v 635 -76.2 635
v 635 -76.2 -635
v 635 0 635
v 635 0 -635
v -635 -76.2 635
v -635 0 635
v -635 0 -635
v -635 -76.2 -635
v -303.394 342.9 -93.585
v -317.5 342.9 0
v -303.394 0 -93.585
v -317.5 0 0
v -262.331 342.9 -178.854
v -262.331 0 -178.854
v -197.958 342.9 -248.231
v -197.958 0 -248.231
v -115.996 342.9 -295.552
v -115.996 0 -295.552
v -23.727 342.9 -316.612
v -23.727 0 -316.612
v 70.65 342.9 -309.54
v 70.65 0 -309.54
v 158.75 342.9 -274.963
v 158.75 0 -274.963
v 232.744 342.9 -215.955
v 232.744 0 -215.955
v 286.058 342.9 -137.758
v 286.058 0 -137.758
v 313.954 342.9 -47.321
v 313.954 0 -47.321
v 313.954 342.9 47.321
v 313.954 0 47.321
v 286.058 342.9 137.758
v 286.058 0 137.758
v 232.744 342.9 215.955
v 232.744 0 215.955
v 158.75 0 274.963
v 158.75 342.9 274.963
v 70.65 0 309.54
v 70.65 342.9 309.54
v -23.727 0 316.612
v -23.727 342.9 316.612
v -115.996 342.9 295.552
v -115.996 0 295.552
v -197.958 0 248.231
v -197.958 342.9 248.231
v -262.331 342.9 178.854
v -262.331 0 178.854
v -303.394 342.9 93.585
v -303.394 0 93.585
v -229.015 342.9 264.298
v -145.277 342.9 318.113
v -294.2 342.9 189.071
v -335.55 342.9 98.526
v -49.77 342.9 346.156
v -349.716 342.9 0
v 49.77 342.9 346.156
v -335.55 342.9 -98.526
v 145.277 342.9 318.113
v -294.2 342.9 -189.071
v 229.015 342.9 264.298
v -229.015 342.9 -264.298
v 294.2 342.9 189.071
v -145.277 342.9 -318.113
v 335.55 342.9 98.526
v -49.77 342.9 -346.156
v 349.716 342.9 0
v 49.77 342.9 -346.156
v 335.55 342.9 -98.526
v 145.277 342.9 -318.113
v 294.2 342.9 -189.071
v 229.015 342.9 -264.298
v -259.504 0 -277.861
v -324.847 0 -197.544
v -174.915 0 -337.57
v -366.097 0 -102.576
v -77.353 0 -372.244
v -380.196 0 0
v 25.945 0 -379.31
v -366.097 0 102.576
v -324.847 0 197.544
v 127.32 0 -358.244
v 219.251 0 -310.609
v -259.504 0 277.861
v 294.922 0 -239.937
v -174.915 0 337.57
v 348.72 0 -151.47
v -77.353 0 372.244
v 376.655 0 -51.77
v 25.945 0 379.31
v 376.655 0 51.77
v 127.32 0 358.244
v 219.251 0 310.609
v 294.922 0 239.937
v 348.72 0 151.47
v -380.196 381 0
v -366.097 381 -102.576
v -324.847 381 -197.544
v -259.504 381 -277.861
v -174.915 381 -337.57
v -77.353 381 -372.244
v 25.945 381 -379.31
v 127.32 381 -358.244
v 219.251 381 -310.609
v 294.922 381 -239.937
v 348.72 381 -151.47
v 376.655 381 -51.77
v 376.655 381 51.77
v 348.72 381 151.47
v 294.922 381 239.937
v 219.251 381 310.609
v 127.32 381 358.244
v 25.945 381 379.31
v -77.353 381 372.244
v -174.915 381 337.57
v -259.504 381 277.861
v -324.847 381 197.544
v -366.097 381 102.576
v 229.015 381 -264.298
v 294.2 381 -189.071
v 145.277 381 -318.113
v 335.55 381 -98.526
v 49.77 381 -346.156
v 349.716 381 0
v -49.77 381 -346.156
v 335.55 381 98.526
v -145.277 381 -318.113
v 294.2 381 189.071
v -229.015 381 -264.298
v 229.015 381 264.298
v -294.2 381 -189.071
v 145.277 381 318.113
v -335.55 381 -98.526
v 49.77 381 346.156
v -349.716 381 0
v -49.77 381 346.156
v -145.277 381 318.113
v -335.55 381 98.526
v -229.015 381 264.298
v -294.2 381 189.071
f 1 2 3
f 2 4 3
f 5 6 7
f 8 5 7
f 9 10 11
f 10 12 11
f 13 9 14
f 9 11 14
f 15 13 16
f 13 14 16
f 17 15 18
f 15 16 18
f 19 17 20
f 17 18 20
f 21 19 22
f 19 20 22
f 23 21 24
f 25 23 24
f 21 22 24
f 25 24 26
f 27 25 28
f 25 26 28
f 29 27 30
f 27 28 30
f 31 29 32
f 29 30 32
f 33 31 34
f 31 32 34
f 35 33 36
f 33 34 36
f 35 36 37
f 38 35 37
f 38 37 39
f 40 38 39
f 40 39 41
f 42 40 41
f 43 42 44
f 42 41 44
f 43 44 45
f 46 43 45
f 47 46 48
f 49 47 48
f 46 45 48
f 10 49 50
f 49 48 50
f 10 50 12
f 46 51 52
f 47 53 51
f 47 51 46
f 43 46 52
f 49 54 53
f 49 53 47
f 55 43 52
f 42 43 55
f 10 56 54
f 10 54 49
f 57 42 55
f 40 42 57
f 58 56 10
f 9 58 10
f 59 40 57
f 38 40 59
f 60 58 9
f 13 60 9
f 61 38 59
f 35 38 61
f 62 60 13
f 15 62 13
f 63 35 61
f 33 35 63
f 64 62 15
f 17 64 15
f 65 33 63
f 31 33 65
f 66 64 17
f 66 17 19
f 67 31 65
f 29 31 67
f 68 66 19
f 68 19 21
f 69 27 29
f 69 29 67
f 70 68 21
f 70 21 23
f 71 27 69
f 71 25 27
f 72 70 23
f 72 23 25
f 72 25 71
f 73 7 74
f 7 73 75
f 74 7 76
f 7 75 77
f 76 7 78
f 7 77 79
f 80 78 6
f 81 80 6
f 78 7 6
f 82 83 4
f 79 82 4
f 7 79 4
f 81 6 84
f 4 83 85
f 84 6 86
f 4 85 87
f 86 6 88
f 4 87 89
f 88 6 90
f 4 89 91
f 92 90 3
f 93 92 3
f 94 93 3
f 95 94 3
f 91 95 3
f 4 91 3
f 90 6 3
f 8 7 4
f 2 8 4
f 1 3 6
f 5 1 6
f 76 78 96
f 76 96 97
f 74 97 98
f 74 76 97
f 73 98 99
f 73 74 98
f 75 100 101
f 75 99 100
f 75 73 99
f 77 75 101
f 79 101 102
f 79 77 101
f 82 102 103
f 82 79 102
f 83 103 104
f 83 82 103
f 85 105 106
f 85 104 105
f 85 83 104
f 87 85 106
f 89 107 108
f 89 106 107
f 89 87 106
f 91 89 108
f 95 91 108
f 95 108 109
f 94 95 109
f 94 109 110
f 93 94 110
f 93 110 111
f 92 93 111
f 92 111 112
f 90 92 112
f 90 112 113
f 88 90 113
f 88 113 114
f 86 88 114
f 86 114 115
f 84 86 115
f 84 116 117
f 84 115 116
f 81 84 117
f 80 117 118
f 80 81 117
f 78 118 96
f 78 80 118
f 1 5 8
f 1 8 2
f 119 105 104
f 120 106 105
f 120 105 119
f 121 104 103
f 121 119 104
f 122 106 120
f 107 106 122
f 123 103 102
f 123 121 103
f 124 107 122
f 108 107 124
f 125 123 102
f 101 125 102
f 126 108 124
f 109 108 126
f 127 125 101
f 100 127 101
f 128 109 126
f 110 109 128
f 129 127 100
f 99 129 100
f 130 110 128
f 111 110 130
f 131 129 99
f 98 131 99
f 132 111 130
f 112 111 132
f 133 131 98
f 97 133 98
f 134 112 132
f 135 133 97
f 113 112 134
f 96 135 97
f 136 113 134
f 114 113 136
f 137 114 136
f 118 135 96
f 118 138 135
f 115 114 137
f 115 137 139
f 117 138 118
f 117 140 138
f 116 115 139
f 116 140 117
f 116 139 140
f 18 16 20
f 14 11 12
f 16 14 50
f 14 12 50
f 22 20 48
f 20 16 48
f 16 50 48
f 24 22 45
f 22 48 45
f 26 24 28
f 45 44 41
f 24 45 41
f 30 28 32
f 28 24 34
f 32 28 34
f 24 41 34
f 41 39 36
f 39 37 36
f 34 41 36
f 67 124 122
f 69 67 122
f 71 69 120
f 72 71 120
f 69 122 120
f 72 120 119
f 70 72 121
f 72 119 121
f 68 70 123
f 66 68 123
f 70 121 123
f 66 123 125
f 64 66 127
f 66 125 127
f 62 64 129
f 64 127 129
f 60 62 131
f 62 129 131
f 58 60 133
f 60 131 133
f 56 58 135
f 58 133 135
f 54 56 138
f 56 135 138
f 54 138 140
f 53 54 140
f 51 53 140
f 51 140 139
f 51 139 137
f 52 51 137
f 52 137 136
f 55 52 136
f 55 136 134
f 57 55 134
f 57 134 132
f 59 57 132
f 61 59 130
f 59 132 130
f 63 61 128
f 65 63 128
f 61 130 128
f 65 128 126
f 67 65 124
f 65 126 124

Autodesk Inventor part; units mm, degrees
ref_plane "YZ Plane" through (0, 0, 0) normal (1, 0, 0) x (0, 1, 0)
ref_plane "XZ Plane" through (0, 0, 0) normal (0, 1, 0) x (-1, 0, 0)
ref_plane "XY Plane" through (0, 0, 0) normal (0, 0, 1) x (1, 0, 0)
sketch "Sketch1" plane through (0, 0, 0) normal (0, 1, 0) x (-1, 0, 0)
  circle A0 centre (0, 0) radius 317.5
  circle A1 centre (0, 0) radius 380.1959
  dimension "d0" = 635
  dimension "d1" = 760.3918
extrude "Extrusion1" add sketch "Sketch1" along normal blind 381
sketch "Sketch2" plane through (0, 0, 0) normal (0, -1, 0) x (1, 0, 0)
  line L0 (635, 635) -> (-635, 635)
  line L1 (-635, 635) -> (-635, -635)
  line L2 (-635, -635) -> (635, -635)
  line L3 (635, -635) -> (635, 635)
  circle A0 centre (0, 0) radius 380.1959 projected
  dimension "d4" = 635
  dimension "d5" = 635
  dimension "d6" = 635
  dimension "d7" = 635
extrude "Extrusion2" add sketch "Sketch2" along normal blind 76.2 contours L3 L2 L1 L0 | A0
sketch "Sketch3" plane through (0, 381, 0) normal (0, 1, 0) x (1, 0, 0)
  circle A0 centre (0, 0) radius 349.7159
  circle A1 centre (0, 0) radius 380.1959 projected
  circle A2 centre (0, 0) radius 317.5 projected
  dimension "d10" = 30.48
  dimension "d11" = 760.3918
  dimension "d12" = 32.2159
extrude "Extrusion3" cut sketch "Sketch3" against normal blind 38.1 contours A0 | A2
properties part number "1"
